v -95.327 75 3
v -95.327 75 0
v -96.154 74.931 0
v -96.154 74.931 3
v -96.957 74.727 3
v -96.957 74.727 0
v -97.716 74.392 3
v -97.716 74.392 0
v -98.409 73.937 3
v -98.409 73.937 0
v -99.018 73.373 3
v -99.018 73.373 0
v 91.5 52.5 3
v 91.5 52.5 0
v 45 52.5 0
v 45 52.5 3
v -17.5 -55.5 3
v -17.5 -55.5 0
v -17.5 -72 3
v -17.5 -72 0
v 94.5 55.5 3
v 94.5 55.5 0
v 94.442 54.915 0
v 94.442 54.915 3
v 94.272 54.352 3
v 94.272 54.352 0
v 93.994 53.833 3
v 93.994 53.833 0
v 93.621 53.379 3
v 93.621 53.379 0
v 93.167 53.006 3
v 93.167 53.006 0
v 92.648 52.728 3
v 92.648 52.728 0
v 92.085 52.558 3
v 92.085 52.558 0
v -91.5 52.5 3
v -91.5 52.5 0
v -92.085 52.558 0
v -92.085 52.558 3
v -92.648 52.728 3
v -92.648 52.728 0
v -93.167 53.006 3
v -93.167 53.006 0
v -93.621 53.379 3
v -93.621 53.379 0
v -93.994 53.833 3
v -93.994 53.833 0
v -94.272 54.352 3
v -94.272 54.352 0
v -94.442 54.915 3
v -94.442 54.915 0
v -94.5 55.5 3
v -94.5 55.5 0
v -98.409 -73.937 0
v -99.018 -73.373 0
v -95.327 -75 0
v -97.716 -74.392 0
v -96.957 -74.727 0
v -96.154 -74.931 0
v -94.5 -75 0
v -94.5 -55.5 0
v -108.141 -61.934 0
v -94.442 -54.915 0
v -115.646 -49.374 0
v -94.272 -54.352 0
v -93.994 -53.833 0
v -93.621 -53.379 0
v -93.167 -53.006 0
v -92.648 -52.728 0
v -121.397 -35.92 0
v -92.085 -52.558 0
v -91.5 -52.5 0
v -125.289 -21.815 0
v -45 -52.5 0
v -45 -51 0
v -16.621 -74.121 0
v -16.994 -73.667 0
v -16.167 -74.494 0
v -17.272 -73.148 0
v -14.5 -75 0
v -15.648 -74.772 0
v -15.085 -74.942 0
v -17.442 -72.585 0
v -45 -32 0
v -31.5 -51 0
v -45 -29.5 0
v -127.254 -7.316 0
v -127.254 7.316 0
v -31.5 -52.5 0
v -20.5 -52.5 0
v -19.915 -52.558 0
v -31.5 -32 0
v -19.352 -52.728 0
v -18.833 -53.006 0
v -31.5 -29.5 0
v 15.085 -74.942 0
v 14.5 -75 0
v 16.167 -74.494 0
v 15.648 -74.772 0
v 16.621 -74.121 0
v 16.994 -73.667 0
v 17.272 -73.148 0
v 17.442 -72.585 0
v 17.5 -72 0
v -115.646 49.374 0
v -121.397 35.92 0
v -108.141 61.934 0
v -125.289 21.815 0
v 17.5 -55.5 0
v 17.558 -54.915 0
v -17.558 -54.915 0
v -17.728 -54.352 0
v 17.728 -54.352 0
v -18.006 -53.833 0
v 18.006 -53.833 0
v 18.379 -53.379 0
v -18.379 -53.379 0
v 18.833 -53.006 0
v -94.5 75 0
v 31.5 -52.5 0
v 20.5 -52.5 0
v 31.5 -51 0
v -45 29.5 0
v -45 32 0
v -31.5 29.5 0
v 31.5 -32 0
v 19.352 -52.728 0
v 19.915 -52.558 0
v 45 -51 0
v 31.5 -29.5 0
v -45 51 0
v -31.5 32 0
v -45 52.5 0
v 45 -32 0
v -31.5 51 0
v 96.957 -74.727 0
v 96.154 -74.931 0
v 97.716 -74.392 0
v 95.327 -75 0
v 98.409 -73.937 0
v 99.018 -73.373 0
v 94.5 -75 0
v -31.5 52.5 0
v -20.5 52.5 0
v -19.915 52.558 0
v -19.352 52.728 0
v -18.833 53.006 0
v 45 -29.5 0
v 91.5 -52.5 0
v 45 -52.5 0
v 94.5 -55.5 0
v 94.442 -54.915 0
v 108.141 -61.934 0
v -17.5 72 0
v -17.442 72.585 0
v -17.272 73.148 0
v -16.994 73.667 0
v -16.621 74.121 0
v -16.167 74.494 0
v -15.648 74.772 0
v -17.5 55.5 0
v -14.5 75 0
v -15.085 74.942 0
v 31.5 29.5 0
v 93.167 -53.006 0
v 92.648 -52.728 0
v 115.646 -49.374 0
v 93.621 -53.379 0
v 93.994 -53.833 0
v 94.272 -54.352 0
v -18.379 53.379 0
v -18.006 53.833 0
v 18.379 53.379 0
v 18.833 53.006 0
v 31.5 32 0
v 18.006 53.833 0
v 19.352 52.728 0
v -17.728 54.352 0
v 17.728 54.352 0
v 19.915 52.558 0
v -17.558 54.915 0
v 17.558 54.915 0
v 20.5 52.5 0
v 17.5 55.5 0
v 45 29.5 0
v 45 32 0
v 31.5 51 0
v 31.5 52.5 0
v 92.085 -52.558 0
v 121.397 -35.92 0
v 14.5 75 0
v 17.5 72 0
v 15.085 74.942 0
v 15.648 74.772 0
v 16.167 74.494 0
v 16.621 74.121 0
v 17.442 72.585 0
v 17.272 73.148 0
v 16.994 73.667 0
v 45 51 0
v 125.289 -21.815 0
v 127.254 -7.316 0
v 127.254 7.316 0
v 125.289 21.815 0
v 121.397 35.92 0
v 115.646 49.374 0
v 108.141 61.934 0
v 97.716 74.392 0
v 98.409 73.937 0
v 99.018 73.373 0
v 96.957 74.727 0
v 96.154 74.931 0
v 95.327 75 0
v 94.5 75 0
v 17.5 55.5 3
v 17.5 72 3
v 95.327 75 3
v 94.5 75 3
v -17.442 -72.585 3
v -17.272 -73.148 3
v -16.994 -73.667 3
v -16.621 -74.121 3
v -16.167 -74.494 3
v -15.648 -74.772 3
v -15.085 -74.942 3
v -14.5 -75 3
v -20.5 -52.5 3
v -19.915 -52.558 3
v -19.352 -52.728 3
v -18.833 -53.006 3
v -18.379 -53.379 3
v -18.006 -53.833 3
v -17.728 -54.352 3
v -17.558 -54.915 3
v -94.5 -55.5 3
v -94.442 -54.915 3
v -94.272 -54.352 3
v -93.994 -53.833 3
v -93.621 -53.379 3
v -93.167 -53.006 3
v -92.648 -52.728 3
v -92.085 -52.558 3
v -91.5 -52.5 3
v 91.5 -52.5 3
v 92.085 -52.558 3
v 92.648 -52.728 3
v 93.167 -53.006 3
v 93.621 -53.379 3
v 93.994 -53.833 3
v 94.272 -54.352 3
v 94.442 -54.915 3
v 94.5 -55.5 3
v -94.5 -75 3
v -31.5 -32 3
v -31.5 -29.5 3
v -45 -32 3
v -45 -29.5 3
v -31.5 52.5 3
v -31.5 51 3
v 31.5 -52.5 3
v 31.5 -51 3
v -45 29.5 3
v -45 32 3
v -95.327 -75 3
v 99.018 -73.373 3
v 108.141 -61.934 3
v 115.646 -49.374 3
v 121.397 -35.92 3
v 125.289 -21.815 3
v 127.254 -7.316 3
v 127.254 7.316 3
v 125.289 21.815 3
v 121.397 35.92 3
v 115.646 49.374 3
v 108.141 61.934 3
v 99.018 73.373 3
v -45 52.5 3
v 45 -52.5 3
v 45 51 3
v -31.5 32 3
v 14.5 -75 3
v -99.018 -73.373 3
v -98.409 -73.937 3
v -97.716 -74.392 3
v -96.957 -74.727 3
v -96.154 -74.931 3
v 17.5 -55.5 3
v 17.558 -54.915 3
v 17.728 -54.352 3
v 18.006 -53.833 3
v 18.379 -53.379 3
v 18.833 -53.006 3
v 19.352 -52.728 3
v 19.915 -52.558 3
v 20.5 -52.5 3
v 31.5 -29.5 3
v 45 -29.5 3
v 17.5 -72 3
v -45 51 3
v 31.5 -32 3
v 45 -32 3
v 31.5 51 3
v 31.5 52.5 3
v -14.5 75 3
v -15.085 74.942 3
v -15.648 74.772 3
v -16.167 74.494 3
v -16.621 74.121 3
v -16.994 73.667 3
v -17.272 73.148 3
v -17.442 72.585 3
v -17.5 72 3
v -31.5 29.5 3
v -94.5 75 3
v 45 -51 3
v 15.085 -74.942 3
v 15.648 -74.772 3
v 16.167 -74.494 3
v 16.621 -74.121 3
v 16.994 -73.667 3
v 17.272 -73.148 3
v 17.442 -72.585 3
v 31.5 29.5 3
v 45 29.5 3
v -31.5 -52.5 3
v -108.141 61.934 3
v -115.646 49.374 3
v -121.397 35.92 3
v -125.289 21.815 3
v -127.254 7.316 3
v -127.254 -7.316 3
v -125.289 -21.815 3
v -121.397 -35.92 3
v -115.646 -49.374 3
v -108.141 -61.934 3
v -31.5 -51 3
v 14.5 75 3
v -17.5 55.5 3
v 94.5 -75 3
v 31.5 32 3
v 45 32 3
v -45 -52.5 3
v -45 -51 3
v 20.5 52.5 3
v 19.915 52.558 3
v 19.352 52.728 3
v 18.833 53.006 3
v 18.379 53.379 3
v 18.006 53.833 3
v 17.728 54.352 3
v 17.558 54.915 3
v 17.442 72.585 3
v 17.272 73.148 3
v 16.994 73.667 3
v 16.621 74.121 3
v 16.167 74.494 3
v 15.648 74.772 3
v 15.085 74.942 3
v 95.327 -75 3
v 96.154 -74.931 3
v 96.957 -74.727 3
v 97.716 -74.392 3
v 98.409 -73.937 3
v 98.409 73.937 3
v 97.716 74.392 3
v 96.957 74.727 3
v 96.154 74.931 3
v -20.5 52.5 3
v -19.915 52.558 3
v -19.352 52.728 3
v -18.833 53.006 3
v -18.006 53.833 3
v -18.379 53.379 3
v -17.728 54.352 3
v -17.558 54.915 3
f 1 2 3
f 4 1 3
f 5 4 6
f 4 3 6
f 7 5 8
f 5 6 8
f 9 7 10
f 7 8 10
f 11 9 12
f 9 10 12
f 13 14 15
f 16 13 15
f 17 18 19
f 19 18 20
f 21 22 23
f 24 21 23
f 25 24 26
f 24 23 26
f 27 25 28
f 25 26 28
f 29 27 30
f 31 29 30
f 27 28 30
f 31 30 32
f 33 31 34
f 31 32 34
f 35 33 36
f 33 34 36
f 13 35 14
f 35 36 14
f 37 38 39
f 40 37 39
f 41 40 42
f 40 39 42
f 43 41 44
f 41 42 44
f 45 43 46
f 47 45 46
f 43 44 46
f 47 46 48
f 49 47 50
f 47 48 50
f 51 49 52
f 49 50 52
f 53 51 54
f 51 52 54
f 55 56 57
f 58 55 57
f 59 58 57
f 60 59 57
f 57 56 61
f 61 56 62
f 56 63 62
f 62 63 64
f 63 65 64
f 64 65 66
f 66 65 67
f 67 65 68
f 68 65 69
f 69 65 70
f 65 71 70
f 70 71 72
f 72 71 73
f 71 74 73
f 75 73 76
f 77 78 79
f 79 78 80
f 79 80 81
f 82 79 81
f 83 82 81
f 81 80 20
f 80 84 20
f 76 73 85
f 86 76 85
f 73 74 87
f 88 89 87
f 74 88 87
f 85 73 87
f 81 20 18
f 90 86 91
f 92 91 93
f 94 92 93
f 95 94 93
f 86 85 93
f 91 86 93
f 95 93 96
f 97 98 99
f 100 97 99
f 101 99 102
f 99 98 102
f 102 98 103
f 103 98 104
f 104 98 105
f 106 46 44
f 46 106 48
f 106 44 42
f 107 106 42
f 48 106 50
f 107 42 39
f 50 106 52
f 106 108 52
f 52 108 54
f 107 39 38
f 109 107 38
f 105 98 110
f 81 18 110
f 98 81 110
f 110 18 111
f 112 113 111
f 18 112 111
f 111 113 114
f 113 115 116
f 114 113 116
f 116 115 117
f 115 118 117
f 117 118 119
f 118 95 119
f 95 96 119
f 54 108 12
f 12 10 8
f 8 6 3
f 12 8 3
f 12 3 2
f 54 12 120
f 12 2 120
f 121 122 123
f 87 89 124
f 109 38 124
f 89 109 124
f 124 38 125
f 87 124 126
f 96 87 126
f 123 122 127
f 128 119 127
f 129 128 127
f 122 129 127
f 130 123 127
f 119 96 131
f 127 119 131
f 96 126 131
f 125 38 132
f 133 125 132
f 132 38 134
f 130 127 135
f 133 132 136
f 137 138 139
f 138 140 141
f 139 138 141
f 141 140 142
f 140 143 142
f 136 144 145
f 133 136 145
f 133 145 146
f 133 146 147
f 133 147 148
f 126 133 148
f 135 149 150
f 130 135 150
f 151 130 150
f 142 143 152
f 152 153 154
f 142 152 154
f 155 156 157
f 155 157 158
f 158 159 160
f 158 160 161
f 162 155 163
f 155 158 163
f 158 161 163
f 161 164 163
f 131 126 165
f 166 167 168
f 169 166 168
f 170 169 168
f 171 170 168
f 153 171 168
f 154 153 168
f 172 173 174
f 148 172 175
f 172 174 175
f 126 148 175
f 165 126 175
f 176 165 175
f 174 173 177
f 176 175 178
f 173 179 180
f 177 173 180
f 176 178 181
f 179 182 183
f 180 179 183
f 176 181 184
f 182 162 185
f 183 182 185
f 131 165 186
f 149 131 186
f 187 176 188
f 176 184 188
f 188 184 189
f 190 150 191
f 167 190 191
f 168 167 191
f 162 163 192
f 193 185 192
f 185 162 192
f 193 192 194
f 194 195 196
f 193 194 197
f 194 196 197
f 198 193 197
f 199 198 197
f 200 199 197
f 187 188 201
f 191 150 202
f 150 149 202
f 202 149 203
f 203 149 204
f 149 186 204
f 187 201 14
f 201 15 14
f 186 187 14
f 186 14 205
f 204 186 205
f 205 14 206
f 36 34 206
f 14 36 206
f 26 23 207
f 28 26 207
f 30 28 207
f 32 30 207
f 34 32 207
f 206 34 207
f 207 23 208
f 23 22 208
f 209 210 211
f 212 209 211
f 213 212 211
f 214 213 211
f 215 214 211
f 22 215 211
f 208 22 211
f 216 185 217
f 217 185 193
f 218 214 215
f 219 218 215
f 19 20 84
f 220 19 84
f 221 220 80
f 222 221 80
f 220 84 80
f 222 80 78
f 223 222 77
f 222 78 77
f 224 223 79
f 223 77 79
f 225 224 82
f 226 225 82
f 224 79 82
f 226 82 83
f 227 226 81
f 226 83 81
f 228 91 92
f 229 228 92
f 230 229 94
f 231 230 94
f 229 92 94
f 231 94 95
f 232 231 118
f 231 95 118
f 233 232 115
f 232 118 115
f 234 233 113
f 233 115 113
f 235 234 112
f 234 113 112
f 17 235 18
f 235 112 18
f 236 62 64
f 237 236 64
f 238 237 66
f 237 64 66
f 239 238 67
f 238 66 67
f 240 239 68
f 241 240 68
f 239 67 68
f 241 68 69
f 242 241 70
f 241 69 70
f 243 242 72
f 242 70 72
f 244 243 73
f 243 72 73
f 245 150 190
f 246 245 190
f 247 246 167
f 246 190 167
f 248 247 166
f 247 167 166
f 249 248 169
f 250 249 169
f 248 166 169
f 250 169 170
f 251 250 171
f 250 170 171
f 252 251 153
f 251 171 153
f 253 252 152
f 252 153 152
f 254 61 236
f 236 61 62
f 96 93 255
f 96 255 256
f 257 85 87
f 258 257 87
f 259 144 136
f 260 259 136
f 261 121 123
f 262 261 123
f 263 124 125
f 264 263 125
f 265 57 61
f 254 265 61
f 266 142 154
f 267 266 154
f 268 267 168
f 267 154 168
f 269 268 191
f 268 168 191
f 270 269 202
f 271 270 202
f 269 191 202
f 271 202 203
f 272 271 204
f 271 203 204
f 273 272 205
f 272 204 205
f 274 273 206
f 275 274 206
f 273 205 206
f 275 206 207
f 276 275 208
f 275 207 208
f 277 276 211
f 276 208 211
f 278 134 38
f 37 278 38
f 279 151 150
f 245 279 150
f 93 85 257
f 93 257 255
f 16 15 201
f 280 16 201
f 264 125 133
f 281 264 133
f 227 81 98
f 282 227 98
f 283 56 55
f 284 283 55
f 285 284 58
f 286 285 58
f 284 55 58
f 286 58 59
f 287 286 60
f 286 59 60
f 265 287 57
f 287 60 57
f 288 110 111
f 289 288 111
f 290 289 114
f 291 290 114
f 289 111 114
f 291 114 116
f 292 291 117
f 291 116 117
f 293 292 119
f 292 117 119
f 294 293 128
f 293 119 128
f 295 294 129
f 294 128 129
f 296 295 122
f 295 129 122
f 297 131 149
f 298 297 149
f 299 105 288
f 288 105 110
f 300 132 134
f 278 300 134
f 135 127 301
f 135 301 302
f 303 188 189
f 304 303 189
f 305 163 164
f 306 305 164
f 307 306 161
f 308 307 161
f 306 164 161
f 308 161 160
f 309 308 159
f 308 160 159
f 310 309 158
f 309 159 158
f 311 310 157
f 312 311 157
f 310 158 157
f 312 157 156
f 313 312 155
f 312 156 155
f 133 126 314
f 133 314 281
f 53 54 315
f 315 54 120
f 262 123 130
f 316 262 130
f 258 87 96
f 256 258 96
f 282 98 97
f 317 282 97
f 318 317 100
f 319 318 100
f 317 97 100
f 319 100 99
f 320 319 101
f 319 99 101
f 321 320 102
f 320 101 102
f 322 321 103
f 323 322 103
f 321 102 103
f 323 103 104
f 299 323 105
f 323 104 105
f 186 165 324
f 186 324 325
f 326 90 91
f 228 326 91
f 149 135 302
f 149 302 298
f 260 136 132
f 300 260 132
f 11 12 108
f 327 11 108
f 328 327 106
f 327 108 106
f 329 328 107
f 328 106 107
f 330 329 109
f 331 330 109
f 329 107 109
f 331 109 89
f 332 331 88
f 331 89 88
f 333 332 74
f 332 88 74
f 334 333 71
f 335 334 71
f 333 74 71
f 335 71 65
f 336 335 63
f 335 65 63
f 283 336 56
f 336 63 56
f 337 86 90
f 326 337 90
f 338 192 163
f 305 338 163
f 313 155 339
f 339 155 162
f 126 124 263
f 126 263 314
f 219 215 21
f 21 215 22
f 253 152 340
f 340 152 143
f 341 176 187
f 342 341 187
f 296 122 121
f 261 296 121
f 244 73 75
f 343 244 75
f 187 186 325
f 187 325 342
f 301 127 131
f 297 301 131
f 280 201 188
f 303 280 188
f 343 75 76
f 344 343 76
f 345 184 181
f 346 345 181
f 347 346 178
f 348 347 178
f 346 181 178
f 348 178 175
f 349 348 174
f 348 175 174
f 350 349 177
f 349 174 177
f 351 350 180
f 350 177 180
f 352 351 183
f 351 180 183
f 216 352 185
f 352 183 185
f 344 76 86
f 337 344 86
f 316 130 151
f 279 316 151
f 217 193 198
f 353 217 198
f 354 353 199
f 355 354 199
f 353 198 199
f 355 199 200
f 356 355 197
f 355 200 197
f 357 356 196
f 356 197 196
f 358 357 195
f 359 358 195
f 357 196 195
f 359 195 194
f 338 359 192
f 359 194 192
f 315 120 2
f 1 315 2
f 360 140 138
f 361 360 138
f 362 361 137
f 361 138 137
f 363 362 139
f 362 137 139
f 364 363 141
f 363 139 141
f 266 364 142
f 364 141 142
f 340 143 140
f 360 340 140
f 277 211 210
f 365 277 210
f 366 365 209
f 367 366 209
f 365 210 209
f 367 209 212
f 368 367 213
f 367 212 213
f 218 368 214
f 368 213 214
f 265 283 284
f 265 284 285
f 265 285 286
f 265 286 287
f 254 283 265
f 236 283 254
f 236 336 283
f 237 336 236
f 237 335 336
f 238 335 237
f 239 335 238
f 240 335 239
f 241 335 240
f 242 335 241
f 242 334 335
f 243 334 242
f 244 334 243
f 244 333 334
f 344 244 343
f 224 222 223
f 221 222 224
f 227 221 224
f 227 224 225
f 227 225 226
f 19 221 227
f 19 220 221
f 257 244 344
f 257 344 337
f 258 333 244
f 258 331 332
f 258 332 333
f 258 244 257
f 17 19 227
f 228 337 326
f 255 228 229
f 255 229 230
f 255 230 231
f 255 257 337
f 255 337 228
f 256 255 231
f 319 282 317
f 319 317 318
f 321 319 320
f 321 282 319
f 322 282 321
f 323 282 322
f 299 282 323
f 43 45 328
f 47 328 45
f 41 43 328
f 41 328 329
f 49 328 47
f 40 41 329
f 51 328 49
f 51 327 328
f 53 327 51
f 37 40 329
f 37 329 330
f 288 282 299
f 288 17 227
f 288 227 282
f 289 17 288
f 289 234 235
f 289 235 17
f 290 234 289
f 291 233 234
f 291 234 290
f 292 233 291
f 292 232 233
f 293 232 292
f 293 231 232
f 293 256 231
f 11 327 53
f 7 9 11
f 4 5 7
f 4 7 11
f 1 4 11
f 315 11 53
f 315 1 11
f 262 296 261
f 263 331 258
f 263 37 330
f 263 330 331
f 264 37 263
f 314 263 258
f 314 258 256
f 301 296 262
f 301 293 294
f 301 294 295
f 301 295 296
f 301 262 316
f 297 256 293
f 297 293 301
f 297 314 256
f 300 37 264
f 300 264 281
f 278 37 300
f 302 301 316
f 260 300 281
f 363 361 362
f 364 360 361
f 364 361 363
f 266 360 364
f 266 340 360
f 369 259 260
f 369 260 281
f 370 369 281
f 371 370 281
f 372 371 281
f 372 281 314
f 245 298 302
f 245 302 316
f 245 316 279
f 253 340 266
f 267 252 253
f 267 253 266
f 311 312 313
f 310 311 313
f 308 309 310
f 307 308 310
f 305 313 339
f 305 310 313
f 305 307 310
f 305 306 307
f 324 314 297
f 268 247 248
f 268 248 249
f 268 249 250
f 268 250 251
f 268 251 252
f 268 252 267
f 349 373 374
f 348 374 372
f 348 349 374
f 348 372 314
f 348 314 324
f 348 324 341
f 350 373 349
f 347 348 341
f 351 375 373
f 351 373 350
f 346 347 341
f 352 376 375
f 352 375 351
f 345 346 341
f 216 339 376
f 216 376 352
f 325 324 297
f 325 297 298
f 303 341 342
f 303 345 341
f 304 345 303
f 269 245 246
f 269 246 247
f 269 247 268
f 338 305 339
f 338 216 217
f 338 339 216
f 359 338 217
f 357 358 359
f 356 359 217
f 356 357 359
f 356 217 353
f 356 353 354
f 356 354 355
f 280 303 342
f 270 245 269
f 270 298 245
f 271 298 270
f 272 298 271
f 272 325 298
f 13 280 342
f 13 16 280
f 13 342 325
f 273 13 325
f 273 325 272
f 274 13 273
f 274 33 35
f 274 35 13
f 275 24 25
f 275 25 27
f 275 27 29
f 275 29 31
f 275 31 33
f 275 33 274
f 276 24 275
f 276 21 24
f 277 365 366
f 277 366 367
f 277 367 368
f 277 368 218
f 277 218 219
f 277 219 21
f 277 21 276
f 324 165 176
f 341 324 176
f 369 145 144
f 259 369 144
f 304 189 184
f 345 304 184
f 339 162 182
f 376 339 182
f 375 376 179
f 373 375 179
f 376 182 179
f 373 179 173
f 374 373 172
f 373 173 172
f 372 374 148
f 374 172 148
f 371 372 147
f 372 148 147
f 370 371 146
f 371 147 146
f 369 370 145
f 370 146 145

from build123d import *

# Parameters (mm, degrees)
IZIM1_W                     = 13.5
IZIM1_H                     = 2.5
Y_KSEKLIK_EKSTR_ZYON1_DEPTH = 3


with BuildPart() as part:
    # Çizim1 → Yükseklik-Ekstrüzyon1 (new body)
    with BuildSketch(Plane.XY):
        with BuildLine():
            Line((-17.5, 72), (-17.5, 55.5))
            ThreePointArc((-17.5, 55.5), (-18.378679656, 53.378679656), (-20.5, 52.5))
            Line((-20.5, 52.5), (-31.5, 52.5))
            Line((-31.5, 52.5), (-31.5, 51))
            Line((-31.5, 51), (-45, 51))
            Line((-45, 51), (-45, 52.5))
            Line((-45, 52.5), (-91.5, 52.5))
            ThreePointArc((-91.5, 52.5), (-93.621320344, 53.378679656), (-94.5, 55.5))
            Line((-94.5, 55.5), (-94.5, 75))
            Line((-94.5, 75), (-95.327166962, 75))
            ThreePointArc((-95.327166962, 75), (-97.34366518, 74.575339872), (-99.01763284, 73.373493976))
            ThreePointArc((-99.01763284, 73.373493976), (-127.5, 0), (-99.01763284, -73.373493976))
            ThreePointArc((-99.01763284, -73.373493976), (-97.34366518, -74.575339872), (-95.327166962, -75))
            Line((-95.327166962, -75), (-94.5, -75))
            Line((-94.5, -75), (-94.5, -55.5))
            ThreePointArc((-94.5, -55.5), (-93.621320344, -53.378679656), (-91.5, -52.5))
            Line((-91.5, -52.5), (-45, -52.5))
            Line((-45, -52.5), (-45, -51))
            Line((-45, -51), (-31.5, -51))
            Line((-31.5, -51), (-31.5, -52.5))
            Line((-31.5, -52.5), (-20.5, -52.5))
            ThreePointArc((-20.5, -52.5), (-18.378679656, -53.378679656), (-17.5, -55.5))
            Line((-17.5, -55.5), (-17.5, -72))
            ThreePointArc((-17.5, -72), (-16.621320344, -74.121320344), (-14.5, -75))
            Line((-14.5, -75), (14.5, -75))
            ThreePointArc((14.5, -75), (16.621320344, -74.121320344), (17.5, -72))
            Line((17.5, -72), (17.5, -55.5))
            ThreePointArc((17.5, -55.5), (18.378679656, -53.378679656), (20.5, -52.5))
            Line((20.5, -52.5), (31.5, -52.5))
            Line((31.5, -52.5), (31.5, -51))
            Line((31.5, -51), (45, -51))
            Line((45, -51), (45, -52.5))
            Line((45, -52.5), (91.5, -52.5))
            ThreePointArc((91.5, -52.5), (93.621320344, -53.378679656), (94.5, -55.5))
            Line((94.5, -55.5), (94.5, -75))
            Line((94.5, -75), (95.327166962, -75))
            ThreePointArc((95.327166962, -75), (97.34366518, -74.575339872), (99.01763284, -73.373493976))
            ThreePointArc((99.01763284, -73.373493976), (127.5, 0), (99.01763284, 73.373493976))
            ThreePointArc((99.01763284, 73.373493976), (97.34366518, 74.575339872), (95.327166962, 75))
            Line((95.327166962, 75), (94.5, 75))
            Line((94.5, 75), (94.5, 55.5))
            ThreePointArc((94.5, 55.5), (93.621320344, 53.378679656), (91.5, 52.5))
            Line((91.5, 52.5), (45, 52.5))
            Line((45, 52.5), (45, 51))
            Line((45, 51), (31.5, 51))
            Line((31.5, 51), (31.5, 52.5))
            Line((31.5, 52.5), (20.5, 52.5))
            ThreePointArc((20.5, 52.5), (18.378679656, 53.378679656), (17.5, 55.5))
            Line((17.5, 55.5), (17.5, 72))
            ThreePointArc((17.5, 72), (16.621320344, 74.121320344), (14.5, 75))
            Line((14.5, 75), (-14.5, 75))
            ThreePointArc((-14.5, 75), (-16.621320344, 74.121320344), (-17.5, 72))
        make_face()
        with Locations((38.25, 30.75)):
            Rectangle(IZIM1_W, IZIM1_H, mode=Mode.SUBTRACT)
        with Locations((-38.25, -30.75)):
            Rectangle(IZIM1_W, IZIM1_H, mode=Mode.SUBTRACT)
        with Locations((-38.25, 30.75)):
            Rectangle(IZIM1_W, IZIM1_H, mode=Mode.SUBTRACT)
        with Locations((38.25, -30.75)):
            Rectangle(IZIM1_W, IZIM1_H, mode=Mode.SUBTRACT)
    extrude(amount=Y_KSEKLIK_EKSTR_ZYON1_DEPTH)


solid = part.part
